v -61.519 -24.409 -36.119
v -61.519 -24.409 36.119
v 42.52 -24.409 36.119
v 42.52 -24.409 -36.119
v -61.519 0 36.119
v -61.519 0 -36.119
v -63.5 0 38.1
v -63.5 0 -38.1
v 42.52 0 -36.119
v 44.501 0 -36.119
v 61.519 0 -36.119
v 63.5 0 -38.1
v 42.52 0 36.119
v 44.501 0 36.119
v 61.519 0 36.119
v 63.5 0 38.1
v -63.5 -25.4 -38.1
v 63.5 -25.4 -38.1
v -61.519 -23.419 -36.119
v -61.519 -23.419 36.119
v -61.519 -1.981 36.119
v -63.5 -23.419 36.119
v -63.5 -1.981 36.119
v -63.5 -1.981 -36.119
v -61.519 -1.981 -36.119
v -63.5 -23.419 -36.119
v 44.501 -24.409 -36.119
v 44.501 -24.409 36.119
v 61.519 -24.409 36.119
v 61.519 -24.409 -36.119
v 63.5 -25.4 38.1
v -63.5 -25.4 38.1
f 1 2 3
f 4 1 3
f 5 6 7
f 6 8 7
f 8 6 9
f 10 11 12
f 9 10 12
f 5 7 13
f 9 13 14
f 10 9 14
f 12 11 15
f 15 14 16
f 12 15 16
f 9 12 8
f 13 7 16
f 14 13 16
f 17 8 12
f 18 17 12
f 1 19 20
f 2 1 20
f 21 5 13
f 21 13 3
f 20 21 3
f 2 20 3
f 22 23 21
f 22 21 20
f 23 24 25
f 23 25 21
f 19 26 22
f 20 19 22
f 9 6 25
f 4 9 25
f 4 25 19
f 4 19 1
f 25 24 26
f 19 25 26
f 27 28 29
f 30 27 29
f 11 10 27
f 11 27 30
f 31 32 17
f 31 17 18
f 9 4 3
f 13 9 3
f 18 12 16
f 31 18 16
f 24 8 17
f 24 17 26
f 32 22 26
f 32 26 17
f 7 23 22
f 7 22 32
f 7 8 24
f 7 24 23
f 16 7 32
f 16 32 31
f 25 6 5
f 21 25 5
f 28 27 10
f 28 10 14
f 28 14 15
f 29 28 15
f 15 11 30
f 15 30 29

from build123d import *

# Parameters (mm, degrees)
F0_W     = 127
F0_H     = 76.2
F1_DEPTH = 25.4
F2_W     = 123.0376
F2_H     = 72.2376
F3_DEPTH = 24.4094
F4_W     = 1.9812
F4_H     = 72.2376
F5_DEPTH = 24.4094
F6_W     = 21.4376
F6_H     = 72.2376
F7_DEPTH = 1.9812


with BuildPart() as f1:
    # F0 (on Front) → F1 (new body)
    with BuildSketch(Plane.XZ):
        Rectangle(F0_W, F0_H)
    extrude(amount=F1_DEPTH)

    # F2 (on Front) → F3 (cut)
    with BuildSketch(Plane.XZ):
        Rectangle(F2_W, F2_H)
    extrude(amount=F3_DEPTH, mode=Mode.SUBTRACT)

    # F4 (on face) → F5 (join)
    with BuildSketch(Plane(origin=(0, -24.4094, 0), x_dir=(-1, 0, 0), z_dir=(0, 1, 0))):
        with Locations((-43.5102, 0)):
            Rectangle(F4_W, F4_H)
    extrude(amount=F5_DEPTH)

    # F6 (on face) → F7 (cut)
    with BuildSketch(Plane(origin=(-63.5, 0, 0), x_dir=(0, -1, 0), z_dir=(-1, 0, 0))):
        with Locations((12.7, 0)):
            Rectangle(F6_W, F6_H)
    extrude(amount=-F7_DEPTH, mode=Mode.SUBTRACT)


solid = f1.part
